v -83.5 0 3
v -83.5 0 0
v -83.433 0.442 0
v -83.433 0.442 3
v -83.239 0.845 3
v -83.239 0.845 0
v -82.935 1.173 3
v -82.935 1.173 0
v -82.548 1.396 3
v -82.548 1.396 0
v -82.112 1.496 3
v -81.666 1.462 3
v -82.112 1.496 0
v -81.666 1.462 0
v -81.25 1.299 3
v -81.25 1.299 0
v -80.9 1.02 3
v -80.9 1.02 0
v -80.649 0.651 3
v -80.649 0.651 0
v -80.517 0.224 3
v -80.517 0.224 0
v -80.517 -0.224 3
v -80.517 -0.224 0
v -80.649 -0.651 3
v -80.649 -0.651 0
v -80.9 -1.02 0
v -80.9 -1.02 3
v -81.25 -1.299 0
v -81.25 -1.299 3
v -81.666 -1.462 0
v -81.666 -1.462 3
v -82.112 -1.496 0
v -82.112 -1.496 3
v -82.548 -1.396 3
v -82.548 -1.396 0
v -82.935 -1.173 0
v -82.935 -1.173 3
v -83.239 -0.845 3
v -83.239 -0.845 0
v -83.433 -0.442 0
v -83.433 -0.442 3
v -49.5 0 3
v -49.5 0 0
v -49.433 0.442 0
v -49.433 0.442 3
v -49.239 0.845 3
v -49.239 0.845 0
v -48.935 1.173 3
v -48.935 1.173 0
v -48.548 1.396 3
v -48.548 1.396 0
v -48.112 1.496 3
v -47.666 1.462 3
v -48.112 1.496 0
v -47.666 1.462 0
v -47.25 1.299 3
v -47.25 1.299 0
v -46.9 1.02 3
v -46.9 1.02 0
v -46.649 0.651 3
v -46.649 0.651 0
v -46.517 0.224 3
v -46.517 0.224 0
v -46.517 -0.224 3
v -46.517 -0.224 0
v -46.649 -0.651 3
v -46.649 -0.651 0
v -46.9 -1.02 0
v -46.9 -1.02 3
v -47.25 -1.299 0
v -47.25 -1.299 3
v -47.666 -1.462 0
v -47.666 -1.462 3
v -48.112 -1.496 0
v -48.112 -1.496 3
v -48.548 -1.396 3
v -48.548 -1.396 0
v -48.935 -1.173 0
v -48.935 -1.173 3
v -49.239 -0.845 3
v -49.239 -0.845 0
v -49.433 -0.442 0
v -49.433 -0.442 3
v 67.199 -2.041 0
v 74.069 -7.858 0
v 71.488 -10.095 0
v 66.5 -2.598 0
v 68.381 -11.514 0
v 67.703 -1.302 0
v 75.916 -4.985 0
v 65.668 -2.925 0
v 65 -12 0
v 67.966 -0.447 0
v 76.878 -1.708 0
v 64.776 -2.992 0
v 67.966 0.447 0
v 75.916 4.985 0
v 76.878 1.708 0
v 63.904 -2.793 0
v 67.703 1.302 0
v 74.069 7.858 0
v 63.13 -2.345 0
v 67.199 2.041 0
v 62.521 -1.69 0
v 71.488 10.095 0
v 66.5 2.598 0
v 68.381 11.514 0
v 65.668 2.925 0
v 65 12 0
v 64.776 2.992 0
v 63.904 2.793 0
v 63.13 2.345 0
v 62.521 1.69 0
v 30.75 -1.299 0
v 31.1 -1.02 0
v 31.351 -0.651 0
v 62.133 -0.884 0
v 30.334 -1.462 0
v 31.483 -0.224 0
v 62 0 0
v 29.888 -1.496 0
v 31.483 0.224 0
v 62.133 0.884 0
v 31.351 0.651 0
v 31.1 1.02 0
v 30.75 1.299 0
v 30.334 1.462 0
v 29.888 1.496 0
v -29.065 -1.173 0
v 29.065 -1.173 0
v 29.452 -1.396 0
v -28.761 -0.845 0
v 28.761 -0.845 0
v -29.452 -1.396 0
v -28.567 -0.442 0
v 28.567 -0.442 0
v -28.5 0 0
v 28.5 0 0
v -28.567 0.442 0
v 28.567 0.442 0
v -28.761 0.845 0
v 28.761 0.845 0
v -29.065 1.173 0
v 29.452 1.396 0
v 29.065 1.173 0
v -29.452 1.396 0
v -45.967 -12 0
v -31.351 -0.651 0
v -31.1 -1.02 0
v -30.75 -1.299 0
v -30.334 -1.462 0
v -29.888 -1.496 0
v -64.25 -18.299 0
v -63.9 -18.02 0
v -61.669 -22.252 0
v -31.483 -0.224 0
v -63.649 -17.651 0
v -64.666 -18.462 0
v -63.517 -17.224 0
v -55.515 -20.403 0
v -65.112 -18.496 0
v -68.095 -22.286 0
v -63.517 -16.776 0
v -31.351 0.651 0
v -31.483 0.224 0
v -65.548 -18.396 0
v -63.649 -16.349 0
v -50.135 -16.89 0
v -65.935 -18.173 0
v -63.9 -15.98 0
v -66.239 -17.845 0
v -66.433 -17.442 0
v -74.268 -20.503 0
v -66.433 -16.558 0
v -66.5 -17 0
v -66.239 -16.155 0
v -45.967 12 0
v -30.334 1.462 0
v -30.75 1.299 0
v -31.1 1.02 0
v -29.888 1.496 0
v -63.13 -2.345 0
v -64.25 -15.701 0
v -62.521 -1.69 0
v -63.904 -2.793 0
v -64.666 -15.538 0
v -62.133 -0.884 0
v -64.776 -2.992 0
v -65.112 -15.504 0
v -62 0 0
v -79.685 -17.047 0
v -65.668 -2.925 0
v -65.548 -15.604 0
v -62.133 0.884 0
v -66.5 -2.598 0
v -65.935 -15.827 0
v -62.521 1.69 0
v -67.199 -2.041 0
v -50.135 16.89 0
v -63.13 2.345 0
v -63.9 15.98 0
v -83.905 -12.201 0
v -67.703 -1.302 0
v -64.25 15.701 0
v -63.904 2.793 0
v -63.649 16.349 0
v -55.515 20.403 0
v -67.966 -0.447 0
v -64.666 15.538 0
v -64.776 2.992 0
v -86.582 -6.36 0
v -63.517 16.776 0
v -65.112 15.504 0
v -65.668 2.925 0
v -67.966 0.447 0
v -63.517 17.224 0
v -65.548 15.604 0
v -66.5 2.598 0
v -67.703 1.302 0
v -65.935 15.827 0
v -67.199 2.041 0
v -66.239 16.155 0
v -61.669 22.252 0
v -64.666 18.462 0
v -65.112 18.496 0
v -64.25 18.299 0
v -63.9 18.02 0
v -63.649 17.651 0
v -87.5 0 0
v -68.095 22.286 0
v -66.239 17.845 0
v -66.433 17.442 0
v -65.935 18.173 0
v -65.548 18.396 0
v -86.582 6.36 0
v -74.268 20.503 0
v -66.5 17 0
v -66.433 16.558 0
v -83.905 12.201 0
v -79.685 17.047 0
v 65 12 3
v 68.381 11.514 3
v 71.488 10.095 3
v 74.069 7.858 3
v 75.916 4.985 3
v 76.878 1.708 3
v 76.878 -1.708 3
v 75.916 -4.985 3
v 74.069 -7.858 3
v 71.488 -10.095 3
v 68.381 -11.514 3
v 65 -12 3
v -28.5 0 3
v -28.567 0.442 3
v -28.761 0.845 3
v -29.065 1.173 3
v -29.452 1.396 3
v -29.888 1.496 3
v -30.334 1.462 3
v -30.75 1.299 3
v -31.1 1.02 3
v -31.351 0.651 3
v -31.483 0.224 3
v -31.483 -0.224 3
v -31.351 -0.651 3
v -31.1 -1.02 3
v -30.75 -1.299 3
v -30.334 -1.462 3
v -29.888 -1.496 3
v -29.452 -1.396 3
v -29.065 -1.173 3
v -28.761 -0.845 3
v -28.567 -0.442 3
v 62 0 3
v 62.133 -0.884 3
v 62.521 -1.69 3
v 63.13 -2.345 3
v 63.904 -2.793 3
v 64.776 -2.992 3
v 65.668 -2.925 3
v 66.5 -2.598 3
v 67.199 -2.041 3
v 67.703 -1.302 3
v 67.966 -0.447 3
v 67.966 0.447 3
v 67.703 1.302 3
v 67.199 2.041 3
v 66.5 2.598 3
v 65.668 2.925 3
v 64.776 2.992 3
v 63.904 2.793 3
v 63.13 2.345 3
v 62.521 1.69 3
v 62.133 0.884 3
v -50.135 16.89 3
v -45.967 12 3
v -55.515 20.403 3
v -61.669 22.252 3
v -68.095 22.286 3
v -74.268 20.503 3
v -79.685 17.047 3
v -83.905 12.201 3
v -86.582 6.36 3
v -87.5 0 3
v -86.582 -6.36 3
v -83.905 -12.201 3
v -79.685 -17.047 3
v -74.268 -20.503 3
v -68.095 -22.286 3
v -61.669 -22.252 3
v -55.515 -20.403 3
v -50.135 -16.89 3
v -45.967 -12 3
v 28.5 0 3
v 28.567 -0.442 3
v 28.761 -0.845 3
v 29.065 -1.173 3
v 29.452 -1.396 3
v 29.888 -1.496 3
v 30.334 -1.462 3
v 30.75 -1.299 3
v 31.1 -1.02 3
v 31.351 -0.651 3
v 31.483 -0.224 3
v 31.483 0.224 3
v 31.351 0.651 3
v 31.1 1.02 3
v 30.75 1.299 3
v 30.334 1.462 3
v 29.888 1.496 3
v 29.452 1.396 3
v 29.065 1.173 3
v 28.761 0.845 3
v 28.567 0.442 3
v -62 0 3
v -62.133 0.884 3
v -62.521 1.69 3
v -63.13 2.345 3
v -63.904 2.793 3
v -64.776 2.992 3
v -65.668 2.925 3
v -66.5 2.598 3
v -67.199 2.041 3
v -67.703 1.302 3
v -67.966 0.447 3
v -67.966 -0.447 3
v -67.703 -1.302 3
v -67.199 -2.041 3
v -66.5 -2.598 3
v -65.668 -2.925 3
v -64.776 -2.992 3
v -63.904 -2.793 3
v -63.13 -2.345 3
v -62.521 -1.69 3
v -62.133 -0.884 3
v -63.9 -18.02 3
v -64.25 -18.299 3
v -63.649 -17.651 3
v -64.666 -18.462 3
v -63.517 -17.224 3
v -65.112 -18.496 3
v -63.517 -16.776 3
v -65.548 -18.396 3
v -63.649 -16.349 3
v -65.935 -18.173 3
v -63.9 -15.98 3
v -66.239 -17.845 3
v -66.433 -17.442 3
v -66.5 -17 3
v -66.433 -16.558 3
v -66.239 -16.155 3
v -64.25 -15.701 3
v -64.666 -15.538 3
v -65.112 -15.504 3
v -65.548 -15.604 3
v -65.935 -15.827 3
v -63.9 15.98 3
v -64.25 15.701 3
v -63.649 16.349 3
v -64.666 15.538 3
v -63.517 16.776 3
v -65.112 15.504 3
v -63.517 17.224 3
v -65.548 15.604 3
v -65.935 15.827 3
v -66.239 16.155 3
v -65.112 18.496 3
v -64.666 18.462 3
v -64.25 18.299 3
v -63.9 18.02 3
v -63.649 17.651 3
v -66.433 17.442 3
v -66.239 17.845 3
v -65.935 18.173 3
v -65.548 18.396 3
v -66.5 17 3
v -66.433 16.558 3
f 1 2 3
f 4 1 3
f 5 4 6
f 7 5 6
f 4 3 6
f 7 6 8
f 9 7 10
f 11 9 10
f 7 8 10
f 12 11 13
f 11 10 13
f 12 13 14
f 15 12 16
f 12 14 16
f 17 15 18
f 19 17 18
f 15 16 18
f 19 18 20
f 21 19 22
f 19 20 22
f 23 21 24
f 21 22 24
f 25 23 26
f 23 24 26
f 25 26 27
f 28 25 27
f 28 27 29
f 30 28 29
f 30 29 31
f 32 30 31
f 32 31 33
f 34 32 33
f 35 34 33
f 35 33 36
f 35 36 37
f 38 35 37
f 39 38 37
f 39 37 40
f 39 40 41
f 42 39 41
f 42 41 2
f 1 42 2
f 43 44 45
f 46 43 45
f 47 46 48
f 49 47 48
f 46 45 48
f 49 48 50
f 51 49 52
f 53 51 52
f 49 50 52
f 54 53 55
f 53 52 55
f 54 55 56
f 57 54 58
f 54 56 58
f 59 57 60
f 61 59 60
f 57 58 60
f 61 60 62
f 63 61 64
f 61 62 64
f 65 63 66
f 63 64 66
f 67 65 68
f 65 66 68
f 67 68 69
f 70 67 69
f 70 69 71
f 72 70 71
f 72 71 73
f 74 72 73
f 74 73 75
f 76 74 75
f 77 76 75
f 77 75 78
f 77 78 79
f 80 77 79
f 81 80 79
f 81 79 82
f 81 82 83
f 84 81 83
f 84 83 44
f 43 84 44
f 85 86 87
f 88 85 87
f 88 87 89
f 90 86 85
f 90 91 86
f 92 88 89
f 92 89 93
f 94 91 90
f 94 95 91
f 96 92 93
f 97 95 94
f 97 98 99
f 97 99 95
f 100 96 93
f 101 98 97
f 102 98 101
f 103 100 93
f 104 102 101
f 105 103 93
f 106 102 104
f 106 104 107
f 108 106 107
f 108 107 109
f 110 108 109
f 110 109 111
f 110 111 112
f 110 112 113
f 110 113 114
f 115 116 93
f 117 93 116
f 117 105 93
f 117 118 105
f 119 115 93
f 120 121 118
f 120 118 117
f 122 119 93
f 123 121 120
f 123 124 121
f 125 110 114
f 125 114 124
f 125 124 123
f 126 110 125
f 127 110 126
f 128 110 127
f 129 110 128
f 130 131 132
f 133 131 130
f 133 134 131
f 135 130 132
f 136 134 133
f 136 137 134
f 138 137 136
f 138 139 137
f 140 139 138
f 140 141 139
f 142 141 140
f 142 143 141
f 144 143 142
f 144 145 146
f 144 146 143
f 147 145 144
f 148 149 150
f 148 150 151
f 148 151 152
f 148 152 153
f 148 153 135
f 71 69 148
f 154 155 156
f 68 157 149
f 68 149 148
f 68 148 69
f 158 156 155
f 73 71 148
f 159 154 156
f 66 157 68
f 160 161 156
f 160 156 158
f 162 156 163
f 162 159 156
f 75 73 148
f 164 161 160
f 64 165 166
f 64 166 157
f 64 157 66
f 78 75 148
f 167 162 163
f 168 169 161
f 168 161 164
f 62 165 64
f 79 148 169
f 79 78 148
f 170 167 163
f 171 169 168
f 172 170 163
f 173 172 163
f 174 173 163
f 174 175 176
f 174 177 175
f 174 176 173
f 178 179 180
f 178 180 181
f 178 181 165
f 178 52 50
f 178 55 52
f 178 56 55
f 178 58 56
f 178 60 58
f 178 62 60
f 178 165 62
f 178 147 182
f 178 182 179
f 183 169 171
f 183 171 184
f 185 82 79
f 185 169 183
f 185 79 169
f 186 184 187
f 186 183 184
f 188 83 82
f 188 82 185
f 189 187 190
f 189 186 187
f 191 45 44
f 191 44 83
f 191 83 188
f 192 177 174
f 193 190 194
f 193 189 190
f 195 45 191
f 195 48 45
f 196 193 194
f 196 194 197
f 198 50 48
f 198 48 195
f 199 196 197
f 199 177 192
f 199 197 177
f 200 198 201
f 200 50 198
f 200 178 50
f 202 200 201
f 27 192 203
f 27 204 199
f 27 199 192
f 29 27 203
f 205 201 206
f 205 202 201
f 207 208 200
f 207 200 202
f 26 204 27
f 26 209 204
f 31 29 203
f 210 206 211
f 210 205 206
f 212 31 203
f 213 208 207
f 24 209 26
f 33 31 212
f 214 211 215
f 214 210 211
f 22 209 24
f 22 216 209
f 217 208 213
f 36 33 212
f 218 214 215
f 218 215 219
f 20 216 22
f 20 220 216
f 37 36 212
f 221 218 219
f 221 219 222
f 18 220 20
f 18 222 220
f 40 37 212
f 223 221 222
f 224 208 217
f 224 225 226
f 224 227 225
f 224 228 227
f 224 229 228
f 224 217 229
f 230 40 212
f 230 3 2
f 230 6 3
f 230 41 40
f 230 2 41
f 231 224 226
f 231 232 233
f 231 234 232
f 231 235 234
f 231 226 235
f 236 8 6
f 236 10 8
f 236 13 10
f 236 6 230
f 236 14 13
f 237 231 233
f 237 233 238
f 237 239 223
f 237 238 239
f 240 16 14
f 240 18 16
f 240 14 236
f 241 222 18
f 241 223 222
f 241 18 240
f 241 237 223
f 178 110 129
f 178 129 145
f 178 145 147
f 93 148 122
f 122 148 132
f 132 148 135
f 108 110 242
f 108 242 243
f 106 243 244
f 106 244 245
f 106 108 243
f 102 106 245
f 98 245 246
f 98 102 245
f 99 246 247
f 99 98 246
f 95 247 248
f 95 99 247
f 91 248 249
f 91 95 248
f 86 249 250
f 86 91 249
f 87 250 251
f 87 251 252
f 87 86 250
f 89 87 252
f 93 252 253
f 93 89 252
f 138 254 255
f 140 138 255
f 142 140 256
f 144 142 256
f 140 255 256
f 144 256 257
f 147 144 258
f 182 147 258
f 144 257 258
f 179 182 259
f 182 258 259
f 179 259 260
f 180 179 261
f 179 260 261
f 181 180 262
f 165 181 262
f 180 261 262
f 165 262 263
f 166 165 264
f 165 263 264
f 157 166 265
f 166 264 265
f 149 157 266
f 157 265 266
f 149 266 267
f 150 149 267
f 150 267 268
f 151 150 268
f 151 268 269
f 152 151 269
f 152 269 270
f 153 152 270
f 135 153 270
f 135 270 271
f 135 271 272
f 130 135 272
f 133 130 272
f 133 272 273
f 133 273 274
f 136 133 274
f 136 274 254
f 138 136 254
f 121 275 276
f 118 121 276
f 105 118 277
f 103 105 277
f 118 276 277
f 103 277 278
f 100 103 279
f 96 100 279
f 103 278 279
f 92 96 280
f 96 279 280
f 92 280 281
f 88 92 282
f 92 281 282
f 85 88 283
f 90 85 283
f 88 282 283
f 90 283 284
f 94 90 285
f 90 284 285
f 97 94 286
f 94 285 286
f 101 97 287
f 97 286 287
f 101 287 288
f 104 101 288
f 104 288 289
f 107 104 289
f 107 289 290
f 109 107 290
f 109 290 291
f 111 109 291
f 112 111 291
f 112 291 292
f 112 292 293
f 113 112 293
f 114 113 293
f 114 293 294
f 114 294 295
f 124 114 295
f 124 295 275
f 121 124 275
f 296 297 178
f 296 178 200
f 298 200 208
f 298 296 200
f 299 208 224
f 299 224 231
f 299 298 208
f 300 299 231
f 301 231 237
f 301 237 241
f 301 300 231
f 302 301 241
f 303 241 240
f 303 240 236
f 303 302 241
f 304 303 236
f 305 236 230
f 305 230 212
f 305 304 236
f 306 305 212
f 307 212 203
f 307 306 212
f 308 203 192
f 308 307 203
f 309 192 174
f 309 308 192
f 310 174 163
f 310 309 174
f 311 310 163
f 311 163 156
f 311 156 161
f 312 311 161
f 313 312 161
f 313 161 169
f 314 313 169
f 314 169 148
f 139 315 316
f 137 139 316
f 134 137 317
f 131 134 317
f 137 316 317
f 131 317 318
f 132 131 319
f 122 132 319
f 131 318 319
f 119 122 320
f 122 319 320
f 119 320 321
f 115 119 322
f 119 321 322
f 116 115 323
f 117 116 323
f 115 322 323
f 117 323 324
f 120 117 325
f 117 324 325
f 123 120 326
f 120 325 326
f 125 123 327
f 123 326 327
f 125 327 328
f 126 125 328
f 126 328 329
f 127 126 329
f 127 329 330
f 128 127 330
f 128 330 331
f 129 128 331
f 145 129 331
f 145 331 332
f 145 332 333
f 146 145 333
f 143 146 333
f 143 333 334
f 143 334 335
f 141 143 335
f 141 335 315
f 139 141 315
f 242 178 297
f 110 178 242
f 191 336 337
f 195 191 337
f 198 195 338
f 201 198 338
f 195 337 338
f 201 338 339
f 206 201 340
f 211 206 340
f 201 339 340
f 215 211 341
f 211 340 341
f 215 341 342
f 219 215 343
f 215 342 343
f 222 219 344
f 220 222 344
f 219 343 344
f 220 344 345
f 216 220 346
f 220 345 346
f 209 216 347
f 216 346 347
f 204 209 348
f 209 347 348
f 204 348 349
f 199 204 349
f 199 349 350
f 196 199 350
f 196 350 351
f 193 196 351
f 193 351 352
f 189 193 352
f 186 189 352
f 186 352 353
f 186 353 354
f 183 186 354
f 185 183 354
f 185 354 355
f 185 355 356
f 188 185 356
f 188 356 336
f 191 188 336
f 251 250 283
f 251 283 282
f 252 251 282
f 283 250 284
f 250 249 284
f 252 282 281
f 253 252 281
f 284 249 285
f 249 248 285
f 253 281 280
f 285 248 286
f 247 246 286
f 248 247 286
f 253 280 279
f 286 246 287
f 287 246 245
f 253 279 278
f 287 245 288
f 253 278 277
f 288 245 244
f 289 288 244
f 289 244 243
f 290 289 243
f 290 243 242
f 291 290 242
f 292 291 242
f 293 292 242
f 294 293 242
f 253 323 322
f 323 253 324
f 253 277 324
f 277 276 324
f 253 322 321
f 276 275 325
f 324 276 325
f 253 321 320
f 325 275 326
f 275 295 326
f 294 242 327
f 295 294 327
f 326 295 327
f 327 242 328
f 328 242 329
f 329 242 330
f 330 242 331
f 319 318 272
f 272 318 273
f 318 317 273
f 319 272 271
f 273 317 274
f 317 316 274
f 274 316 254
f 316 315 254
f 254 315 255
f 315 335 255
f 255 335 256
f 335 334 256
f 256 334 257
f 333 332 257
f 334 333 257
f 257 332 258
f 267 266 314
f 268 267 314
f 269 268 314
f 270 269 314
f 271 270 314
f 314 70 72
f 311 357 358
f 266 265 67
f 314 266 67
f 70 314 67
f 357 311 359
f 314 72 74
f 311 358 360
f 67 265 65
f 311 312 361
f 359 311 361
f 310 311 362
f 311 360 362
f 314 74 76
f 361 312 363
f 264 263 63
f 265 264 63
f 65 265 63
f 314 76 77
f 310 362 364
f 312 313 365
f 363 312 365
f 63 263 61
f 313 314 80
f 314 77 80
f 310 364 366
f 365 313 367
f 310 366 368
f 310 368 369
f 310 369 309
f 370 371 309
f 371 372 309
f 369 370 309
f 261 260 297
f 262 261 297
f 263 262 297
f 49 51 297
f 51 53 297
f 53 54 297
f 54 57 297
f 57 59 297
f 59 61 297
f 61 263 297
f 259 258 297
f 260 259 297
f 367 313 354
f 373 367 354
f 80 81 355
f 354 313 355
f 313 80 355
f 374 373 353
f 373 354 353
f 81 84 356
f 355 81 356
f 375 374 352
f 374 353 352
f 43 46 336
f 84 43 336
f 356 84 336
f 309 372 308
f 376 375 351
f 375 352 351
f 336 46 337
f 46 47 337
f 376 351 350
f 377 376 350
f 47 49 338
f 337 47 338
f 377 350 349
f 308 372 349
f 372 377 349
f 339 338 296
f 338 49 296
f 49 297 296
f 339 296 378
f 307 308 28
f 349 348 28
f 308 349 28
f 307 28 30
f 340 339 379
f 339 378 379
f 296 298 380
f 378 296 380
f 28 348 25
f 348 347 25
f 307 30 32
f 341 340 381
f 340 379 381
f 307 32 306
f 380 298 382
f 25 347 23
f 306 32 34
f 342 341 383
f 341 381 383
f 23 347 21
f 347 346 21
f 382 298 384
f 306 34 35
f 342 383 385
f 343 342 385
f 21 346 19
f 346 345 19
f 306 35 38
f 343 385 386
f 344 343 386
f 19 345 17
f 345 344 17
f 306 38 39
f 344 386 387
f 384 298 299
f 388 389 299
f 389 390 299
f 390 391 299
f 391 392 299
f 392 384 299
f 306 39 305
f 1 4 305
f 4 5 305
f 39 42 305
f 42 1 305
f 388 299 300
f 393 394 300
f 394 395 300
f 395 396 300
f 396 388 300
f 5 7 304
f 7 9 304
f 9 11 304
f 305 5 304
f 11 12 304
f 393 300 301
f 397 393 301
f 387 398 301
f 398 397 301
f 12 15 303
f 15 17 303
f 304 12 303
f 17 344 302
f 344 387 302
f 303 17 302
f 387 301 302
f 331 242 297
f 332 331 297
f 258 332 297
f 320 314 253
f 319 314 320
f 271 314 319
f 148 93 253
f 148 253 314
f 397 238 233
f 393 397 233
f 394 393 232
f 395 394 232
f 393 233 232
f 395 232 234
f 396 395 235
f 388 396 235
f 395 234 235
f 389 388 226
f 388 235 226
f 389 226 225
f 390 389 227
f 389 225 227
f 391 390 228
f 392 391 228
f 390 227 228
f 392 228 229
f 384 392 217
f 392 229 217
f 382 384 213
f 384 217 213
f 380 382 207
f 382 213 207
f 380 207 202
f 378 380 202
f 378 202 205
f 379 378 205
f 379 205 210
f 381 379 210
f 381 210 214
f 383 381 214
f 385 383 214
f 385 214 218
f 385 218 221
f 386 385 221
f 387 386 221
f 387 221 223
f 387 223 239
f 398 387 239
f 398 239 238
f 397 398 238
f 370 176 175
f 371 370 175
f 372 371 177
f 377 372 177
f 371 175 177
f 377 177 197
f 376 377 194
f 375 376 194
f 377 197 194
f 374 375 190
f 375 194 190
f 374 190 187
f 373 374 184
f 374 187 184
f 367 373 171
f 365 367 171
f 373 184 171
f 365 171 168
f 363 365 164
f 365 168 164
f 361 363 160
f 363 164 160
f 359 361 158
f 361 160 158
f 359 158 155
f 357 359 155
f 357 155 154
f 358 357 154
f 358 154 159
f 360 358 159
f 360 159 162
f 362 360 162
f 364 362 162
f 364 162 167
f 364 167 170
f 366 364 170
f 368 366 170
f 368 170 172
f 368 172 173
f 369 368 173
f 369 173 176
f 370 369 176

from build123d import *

# Parameters (mm, degrees)
BOSS_EXTRU_1_DEPTH      = 3
ESQUISSE2_R             = 3
ESQUISSE2_R_2           = 1.5
ENL_V_MAT_EXTRU_1_DEPTH = 78.987178433
ESQUISSE3_R             = 22.5
ESQUISSE3_R_2           = 3
BOSS_EXTRU_2_DEPTH      = 3
ESQUISSE4_R             = 1.5
ENL_V_MAT_EXTRU_2_DEPTH = 91.396349484


with BuildPart() as part:
    # Esquisse1 → Boss.-Extru.1 (new body)
    with BuildSketch(Plane.XY):
        with BuildLine():
            Line((-65, 12), (65, 12))
            ThreePointArc((65, 12), (77, 0), (65, -12))
            Line((65, -12), (-65, -12))
            ThreePointArc((-65, -12), (-77, 0), (-65, 12))
        make_face()
    extrude(amount=BOSS_EXTRU_1_DEPTH)

    # Esquisse2 → Enlèv. mat.-Extru.1 (cut, through all)
    with BuildSketch(Plane.XY.offset(3)):
        with Locations((-65, 0)):
            Circle(ESQUISSE2_R)
        with Locations(Location((65, 0, 0), (0, 0, 180))):
            Circle(ESQUISSE2_R)
        with Locations((-30, 0)):
            Circle(ESQUISSE2_R_2)
        with Locations(Location((30, 0, 0), (0, 0, 180))):
            Circle(ESQUISSE2_R_2)
    extrude(amount=-ENL_V_MAT_EXTRU_1_DEPTH, mode=Mode.SUBTRACT)

    # Esquisse3 → Boss.-Extru.2 (add)
    with BuildSketch(Plane.XY.offset(3)):
        with Locations((-65, 0)):
            Circle(ESQUISSE3_R)
        with Locations((-65, 0)):
            Circle(ESQUISSE3_R_2, mode=Mode.SUBTRACT)
    extrude(amount=-BOSS_EXTRU_2_DEPTH)

    # Esquisse4 → Enlèv. mat.-Extru.2 (cut, through all)
    with BuildSketch(Plane(origin=(0, 0, 0), x_dir=(-1, 0, 0), z_dir=(0, 0, -1))):
        with Locations((65, 17)):
            Circle(ESQUISSE4_R)
        with Locations((82, 0)):
            Circle(ESQUISSE4_R)
        with Locations((65, -17)):
            Circle(ESQUISSE4_R)
        with Locations((48, 0)):
            Circle(ESQUISSE4_R)
    extrude(amount=-ENL_V_MAT_EXTRU_2_DEPTH, mode=Mode.SUBTRACT)


solid = part.part
